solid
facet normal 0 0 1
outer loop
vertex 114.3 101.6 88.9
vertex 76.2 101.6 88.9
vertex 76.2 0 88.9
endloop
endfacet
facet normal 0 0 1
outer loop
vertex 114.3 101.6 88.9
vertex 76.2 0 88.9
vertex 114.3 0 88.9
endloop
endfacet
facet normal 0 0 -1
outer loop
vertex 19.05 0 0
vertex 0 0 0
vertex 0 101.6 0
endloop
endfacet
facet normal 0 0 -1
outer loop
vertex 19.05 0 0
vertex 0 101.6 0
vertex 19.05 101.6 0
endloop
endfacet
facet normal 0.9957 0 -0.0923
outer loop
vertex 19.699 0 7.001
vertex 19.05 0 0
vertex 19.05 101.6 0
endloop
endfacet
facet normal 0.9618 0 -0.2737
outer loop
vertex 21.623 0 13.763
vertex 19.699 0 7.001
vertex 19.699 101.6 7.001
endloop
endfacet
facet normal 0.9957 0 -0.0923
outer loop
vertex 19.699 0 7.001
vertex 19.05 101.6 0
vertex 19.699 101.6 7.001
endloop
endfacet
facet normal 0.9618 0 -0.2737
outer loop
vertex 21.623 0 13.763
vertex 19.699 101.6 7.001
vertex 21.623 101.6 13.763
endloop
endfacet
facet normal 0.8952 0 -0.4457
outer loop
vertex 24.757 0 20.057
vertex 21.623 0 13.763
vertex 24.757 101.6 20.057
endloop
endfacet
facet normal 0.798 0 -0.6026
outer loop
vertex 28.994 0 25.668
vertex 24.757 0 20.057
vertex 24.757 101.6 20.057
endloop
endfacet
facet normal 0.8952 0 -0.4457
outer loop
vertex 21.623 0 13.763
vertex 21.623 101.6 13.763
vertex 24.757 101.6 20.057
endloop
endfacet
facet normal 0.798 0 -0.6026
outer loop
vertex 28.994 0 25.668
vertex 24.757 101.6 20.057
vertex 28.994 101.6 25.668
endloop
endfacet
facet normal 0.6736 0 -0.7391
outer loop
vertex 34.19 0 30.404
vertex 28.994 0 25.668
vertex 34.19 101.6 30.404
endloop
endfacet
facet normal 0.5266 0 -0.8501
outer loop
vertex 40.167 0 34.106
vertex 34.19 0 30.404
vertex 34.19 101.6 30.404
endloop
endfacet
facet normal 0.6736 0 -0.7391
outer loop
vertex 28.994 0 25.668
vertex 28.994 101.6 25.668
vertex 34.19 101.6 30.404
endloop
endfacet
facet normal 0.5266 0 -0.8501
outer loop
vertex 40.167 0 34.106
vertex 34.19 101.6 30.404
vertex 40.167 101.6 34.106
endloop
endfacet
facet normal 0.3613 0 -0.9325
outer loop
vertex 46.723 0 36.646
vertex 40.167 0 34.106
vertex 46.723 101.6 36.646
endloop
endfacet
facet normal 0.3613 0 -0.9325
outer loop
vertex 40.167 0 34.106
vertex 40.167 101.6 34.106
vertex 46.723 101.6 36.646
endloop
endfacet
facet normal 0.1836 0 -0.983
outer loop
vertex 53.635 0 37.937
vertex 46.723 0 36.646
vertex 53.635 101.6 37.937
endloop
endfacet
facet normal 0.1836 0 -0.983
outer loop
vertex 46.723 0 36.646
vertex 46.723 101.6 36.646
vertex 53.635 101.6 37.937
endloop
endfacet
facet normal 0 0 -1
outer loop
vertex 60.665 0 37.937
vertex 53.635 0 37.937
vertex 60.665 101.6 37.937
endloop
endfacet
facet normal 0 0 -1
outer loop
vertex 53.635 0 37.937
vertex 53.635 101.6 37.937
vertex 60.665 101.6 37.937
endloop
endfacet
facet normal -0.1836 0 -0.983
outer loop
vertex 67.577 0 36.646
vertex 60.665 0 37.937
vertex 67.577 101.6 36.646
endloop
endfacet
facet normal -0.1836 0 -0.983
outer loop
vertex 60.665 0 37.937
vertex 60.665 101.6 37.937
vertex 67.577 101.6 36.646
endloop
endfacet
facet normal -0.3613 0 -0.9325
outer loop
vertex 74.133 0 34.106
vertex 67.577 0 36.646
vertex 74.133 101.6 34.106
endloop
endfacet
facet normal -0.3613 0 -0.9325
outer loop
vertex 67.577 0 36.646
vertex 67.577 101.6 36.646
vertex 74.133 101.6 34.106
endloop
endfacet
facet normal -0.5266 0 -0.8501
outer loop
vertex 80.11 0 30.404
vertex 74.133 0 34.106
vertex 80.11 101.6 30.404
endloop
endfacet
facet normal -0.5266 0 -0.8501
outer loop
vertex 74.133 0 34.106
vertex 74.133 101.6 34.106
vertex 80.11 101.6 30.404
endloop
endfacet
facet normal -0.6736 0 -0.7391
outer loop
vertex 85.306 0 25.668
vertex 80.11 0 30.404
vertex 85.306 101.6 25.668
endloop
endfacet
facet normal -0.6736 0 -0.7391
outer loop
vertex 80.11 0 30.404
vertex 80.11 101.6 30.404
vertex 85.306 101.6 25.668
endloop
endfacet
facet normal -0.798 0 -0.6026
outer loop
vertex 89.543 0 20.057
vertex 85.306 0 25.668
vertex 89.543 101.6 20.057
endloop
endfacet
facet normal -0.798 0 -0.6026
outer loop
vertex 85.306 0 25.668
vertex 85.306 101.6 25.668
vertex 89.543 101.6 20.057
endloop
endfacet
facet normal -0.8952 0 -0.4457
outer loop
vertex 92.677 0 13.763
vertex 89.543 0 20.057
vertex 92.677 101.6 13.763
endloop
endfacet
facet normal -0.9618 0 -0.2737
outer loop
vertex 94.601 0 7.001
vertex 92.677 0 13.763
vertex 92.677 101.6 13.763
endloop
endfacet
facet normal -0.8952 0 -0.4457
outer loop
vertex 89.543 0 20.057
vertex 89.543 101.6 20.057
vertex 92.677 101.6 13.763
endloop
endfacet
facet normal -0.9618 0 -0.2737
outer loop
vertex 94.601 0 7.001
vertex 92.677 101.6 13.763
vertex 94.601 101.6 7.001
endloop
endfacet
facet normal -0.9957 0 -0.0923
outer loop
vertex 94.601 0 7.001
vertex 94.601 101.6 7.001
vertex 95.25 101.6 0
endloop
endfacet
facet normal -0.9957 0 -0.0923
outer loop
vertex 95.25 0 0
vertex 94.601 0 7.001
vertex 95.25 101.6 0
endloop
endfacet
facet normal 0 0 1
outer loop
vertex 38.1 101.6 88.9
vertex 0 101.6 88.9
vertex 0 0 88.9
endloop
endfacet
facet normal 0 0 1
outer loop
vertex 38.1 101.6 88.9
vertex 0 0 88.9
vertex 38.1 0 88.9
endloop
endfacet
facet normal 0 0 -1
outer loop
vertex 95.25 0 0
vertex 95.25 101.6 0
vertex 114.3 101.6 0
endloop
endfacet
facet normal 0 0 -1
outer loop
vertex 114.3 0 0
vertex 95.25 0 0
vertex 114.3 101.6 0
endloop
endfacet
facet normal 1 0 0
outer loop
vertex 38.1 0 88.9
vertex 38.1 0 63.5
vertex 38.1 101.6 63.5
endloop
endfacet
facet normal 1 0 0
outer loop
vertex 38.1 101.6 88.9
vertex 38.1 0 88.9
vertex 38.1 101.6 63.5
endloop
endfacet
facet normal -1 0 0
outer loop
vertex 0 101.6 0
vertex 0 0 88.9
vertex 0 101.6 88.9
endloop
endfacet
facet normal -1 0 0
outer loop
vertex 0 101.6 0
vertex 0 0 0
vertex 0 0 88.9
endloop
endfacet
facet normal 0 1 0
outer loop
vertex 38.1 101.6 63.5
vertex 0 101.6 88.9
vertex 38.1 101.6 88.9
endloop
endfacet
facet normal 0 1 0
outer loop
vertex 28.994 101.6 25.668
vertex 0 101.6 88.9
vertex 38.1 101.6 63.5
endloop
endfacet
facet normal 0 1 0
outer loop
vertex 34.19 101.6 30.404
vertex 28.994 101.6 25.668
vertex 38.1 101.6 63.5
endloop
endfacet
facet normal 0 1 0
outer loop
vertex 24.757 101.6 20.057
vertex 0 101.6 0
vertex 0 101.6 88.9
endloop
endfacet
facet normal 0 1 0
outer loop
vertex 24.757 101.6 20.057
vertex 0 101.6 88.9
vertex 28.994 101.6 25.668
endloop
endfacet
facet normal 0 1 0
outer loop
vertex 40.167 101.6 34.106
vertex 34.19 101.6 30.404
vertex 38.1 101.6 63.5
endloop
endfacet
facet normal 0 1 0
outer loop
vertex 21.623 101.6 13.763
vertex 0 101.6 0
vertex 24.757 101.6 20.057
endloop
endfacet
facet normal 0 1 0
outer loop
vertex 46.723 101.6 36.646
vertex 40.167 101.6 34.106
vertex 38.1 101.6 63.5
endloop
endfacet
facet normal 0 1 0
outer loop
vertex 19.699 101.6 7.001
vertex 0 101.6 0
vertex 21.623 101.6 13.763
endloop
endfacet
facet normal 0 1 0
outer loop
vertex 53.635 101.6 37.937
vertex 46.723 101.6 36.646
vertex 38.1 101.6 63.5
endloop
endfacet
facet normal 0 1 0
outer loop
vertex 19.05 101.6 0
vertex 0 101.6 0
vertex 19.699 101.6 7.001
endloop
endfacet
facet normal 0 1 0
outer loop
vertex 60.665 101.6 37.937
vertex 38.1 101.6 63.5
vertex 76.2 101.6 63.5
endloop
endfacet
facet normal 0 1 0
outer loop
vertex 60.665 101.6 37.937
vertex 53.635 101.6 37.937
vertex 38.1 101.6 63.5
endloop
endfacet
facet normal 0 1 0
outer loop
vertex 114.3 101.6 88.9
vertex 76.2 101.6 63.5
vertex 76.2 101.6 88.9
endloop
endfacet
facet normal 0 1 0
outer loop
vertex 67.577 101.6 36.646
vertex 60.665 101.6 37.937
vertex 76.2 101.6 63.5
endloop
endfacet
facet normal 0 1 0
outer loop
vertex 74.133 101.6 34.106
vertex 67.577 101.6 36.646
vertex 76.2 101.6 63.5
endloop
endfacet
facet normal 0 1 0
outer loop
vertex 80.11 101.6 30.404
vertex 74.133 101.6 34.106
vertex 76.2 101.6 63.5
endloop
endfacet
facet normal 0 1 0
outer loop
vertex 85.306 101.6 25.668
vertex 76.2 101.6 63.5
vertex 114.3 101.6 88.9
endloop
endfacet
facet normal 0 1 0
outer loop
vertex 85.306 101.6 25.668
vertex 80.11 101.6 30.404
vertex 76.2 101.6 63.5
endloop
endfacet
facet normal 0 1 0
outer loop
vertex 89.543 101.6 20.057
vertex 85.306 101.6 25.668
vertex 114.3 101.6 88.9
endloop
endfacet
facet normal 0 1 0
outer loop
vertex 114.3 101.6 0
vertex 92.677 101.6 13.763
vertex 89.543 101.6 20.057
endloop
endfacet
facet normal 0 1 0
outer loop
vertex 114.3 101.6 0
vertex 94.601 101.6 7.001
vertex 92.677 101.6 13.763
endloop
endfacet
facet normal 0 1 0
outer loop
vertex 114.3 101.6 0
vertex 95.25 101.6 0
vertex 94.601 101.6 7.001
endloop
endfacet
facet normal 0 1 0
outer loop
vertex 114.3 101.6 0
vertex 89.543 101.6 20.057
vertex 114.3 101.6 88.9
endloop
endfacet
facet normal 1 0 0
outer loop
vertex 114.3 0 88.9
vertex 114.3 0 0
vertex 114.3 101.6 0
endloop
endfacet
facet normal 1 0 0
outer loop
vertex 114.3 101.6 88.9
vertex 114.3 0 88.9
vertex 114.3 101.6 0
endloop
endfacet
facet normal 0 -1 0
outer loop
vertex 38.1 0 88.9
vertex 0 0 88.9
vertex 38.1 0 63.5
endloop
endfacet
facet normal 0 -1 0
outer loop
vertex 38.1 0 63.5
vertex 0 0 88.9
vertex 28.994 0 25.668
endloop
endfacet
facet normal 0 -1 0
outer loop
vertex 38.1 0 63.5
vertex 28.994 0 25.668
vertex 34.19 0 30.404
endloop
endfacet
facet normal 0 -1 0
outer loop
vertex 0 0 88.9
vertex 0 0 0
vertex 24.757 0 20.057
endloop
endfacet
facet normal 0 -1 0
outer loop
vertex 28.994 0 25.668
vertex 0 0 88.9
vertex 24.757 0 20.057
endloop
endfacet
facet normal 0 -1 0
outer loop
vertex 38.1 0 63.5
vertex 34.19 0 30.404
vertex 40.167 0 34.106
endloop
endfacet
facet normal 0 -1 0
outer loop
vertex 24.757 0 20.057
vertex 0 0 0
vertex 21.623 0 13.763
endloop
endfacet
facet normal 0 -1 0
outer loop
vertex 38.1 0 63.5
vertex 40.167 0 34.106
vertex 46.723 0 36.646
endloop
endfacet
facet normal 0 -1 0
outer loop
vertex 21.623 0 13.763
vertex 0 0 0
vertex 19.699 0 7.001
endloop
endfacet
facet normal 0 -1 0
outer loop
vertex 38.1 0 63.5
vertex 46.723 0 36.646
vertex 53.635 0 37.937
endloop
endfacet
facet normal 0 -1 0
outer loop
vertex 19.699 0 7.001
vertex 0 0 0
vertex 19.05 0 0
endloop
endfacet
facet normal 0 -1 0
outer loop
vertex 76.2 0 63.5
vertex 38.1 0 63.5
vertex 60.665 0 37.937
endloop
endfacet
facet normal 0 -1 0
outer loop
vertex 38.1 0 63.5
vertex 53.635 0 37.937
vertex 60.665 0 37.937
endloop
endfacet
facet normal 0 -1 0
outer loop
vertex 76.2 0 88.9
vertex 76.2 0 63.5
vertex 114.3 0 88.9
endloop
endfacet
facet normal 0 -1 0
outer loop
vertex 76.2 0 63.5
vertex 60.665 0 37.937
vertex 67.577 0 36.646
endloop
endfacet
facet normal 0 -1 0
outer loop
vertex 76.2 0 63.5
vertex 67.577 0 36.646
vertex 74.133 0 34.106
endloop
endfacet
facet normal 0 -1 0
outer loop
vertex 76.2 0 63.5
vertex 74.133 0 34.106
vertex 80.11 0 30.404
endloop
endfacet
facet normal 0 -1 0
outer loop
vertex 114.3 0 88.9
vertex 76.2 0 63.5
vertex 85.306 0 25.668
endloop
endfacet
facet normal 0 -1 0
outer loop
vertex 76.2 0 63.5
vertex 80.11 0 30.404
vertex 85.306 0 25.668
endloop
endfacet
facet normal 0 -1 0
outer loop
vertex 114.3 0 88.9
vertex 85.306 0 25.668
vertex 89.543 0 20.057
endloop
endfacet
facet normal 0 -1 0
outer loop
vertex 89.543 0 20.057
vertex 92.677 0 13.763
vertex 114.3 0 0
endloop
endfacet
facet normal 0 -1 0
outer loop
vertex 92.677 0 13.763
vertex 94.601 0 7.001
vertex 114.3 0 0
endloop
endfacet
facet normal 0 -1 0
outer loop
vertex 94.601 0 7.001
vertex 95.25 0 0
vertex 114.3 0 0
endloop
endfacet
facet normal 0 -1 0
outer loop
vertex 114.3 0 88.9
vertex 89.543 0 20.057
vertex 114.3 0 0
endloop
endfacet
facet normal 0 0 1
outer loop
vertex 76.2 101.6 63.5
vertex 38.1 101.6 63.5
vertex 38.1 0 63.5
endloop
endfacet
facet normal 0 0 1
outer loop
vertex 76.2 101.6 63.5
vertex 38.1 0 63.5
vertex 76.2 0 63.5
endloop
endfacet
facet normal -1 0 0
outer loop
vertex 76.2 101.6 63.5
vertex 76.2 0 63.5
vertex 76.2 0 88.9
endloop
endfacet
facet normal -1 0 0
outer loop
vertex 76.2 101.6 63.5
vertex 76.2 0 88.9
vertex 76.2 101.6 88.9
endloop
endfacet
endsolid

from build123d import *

# Parameters (mm, degrees)
F0_W     = 114.3
F0_H     = 101.6
F1_DEPTH = 63.5
F2_W     = 38.1
F2_H     = 101.6
F3_DEPTH = 25.4
F5_D     = 76.2


with BuildPart() as f1:
    # F0 (on Top) → F1 (new body)
    with BuildSketch(Plane.XY):
        with Locations((57.15, 50.8)):
            Rectangle(F0_W, F0_H)
    extrude(amount=F1_DEPTH)

    # F2 (on face) → F3 (join)
    with BuildSketch(Plane.XY.offset(63.5)):
        with Locations((19.05, 50.8)):
            Rectangle(F2_W, F2_H)
        with Locations((95.25, 50.8)):
            Rectangle(F2_W, F2_H)
    extrude(amount=F3_DEPTH)

    # F5 (through all)
    with Locations(Plane.XZ):
        with Locations((57.15, 0)):
            Hole(F5_D / 2)


solid = f1.part
